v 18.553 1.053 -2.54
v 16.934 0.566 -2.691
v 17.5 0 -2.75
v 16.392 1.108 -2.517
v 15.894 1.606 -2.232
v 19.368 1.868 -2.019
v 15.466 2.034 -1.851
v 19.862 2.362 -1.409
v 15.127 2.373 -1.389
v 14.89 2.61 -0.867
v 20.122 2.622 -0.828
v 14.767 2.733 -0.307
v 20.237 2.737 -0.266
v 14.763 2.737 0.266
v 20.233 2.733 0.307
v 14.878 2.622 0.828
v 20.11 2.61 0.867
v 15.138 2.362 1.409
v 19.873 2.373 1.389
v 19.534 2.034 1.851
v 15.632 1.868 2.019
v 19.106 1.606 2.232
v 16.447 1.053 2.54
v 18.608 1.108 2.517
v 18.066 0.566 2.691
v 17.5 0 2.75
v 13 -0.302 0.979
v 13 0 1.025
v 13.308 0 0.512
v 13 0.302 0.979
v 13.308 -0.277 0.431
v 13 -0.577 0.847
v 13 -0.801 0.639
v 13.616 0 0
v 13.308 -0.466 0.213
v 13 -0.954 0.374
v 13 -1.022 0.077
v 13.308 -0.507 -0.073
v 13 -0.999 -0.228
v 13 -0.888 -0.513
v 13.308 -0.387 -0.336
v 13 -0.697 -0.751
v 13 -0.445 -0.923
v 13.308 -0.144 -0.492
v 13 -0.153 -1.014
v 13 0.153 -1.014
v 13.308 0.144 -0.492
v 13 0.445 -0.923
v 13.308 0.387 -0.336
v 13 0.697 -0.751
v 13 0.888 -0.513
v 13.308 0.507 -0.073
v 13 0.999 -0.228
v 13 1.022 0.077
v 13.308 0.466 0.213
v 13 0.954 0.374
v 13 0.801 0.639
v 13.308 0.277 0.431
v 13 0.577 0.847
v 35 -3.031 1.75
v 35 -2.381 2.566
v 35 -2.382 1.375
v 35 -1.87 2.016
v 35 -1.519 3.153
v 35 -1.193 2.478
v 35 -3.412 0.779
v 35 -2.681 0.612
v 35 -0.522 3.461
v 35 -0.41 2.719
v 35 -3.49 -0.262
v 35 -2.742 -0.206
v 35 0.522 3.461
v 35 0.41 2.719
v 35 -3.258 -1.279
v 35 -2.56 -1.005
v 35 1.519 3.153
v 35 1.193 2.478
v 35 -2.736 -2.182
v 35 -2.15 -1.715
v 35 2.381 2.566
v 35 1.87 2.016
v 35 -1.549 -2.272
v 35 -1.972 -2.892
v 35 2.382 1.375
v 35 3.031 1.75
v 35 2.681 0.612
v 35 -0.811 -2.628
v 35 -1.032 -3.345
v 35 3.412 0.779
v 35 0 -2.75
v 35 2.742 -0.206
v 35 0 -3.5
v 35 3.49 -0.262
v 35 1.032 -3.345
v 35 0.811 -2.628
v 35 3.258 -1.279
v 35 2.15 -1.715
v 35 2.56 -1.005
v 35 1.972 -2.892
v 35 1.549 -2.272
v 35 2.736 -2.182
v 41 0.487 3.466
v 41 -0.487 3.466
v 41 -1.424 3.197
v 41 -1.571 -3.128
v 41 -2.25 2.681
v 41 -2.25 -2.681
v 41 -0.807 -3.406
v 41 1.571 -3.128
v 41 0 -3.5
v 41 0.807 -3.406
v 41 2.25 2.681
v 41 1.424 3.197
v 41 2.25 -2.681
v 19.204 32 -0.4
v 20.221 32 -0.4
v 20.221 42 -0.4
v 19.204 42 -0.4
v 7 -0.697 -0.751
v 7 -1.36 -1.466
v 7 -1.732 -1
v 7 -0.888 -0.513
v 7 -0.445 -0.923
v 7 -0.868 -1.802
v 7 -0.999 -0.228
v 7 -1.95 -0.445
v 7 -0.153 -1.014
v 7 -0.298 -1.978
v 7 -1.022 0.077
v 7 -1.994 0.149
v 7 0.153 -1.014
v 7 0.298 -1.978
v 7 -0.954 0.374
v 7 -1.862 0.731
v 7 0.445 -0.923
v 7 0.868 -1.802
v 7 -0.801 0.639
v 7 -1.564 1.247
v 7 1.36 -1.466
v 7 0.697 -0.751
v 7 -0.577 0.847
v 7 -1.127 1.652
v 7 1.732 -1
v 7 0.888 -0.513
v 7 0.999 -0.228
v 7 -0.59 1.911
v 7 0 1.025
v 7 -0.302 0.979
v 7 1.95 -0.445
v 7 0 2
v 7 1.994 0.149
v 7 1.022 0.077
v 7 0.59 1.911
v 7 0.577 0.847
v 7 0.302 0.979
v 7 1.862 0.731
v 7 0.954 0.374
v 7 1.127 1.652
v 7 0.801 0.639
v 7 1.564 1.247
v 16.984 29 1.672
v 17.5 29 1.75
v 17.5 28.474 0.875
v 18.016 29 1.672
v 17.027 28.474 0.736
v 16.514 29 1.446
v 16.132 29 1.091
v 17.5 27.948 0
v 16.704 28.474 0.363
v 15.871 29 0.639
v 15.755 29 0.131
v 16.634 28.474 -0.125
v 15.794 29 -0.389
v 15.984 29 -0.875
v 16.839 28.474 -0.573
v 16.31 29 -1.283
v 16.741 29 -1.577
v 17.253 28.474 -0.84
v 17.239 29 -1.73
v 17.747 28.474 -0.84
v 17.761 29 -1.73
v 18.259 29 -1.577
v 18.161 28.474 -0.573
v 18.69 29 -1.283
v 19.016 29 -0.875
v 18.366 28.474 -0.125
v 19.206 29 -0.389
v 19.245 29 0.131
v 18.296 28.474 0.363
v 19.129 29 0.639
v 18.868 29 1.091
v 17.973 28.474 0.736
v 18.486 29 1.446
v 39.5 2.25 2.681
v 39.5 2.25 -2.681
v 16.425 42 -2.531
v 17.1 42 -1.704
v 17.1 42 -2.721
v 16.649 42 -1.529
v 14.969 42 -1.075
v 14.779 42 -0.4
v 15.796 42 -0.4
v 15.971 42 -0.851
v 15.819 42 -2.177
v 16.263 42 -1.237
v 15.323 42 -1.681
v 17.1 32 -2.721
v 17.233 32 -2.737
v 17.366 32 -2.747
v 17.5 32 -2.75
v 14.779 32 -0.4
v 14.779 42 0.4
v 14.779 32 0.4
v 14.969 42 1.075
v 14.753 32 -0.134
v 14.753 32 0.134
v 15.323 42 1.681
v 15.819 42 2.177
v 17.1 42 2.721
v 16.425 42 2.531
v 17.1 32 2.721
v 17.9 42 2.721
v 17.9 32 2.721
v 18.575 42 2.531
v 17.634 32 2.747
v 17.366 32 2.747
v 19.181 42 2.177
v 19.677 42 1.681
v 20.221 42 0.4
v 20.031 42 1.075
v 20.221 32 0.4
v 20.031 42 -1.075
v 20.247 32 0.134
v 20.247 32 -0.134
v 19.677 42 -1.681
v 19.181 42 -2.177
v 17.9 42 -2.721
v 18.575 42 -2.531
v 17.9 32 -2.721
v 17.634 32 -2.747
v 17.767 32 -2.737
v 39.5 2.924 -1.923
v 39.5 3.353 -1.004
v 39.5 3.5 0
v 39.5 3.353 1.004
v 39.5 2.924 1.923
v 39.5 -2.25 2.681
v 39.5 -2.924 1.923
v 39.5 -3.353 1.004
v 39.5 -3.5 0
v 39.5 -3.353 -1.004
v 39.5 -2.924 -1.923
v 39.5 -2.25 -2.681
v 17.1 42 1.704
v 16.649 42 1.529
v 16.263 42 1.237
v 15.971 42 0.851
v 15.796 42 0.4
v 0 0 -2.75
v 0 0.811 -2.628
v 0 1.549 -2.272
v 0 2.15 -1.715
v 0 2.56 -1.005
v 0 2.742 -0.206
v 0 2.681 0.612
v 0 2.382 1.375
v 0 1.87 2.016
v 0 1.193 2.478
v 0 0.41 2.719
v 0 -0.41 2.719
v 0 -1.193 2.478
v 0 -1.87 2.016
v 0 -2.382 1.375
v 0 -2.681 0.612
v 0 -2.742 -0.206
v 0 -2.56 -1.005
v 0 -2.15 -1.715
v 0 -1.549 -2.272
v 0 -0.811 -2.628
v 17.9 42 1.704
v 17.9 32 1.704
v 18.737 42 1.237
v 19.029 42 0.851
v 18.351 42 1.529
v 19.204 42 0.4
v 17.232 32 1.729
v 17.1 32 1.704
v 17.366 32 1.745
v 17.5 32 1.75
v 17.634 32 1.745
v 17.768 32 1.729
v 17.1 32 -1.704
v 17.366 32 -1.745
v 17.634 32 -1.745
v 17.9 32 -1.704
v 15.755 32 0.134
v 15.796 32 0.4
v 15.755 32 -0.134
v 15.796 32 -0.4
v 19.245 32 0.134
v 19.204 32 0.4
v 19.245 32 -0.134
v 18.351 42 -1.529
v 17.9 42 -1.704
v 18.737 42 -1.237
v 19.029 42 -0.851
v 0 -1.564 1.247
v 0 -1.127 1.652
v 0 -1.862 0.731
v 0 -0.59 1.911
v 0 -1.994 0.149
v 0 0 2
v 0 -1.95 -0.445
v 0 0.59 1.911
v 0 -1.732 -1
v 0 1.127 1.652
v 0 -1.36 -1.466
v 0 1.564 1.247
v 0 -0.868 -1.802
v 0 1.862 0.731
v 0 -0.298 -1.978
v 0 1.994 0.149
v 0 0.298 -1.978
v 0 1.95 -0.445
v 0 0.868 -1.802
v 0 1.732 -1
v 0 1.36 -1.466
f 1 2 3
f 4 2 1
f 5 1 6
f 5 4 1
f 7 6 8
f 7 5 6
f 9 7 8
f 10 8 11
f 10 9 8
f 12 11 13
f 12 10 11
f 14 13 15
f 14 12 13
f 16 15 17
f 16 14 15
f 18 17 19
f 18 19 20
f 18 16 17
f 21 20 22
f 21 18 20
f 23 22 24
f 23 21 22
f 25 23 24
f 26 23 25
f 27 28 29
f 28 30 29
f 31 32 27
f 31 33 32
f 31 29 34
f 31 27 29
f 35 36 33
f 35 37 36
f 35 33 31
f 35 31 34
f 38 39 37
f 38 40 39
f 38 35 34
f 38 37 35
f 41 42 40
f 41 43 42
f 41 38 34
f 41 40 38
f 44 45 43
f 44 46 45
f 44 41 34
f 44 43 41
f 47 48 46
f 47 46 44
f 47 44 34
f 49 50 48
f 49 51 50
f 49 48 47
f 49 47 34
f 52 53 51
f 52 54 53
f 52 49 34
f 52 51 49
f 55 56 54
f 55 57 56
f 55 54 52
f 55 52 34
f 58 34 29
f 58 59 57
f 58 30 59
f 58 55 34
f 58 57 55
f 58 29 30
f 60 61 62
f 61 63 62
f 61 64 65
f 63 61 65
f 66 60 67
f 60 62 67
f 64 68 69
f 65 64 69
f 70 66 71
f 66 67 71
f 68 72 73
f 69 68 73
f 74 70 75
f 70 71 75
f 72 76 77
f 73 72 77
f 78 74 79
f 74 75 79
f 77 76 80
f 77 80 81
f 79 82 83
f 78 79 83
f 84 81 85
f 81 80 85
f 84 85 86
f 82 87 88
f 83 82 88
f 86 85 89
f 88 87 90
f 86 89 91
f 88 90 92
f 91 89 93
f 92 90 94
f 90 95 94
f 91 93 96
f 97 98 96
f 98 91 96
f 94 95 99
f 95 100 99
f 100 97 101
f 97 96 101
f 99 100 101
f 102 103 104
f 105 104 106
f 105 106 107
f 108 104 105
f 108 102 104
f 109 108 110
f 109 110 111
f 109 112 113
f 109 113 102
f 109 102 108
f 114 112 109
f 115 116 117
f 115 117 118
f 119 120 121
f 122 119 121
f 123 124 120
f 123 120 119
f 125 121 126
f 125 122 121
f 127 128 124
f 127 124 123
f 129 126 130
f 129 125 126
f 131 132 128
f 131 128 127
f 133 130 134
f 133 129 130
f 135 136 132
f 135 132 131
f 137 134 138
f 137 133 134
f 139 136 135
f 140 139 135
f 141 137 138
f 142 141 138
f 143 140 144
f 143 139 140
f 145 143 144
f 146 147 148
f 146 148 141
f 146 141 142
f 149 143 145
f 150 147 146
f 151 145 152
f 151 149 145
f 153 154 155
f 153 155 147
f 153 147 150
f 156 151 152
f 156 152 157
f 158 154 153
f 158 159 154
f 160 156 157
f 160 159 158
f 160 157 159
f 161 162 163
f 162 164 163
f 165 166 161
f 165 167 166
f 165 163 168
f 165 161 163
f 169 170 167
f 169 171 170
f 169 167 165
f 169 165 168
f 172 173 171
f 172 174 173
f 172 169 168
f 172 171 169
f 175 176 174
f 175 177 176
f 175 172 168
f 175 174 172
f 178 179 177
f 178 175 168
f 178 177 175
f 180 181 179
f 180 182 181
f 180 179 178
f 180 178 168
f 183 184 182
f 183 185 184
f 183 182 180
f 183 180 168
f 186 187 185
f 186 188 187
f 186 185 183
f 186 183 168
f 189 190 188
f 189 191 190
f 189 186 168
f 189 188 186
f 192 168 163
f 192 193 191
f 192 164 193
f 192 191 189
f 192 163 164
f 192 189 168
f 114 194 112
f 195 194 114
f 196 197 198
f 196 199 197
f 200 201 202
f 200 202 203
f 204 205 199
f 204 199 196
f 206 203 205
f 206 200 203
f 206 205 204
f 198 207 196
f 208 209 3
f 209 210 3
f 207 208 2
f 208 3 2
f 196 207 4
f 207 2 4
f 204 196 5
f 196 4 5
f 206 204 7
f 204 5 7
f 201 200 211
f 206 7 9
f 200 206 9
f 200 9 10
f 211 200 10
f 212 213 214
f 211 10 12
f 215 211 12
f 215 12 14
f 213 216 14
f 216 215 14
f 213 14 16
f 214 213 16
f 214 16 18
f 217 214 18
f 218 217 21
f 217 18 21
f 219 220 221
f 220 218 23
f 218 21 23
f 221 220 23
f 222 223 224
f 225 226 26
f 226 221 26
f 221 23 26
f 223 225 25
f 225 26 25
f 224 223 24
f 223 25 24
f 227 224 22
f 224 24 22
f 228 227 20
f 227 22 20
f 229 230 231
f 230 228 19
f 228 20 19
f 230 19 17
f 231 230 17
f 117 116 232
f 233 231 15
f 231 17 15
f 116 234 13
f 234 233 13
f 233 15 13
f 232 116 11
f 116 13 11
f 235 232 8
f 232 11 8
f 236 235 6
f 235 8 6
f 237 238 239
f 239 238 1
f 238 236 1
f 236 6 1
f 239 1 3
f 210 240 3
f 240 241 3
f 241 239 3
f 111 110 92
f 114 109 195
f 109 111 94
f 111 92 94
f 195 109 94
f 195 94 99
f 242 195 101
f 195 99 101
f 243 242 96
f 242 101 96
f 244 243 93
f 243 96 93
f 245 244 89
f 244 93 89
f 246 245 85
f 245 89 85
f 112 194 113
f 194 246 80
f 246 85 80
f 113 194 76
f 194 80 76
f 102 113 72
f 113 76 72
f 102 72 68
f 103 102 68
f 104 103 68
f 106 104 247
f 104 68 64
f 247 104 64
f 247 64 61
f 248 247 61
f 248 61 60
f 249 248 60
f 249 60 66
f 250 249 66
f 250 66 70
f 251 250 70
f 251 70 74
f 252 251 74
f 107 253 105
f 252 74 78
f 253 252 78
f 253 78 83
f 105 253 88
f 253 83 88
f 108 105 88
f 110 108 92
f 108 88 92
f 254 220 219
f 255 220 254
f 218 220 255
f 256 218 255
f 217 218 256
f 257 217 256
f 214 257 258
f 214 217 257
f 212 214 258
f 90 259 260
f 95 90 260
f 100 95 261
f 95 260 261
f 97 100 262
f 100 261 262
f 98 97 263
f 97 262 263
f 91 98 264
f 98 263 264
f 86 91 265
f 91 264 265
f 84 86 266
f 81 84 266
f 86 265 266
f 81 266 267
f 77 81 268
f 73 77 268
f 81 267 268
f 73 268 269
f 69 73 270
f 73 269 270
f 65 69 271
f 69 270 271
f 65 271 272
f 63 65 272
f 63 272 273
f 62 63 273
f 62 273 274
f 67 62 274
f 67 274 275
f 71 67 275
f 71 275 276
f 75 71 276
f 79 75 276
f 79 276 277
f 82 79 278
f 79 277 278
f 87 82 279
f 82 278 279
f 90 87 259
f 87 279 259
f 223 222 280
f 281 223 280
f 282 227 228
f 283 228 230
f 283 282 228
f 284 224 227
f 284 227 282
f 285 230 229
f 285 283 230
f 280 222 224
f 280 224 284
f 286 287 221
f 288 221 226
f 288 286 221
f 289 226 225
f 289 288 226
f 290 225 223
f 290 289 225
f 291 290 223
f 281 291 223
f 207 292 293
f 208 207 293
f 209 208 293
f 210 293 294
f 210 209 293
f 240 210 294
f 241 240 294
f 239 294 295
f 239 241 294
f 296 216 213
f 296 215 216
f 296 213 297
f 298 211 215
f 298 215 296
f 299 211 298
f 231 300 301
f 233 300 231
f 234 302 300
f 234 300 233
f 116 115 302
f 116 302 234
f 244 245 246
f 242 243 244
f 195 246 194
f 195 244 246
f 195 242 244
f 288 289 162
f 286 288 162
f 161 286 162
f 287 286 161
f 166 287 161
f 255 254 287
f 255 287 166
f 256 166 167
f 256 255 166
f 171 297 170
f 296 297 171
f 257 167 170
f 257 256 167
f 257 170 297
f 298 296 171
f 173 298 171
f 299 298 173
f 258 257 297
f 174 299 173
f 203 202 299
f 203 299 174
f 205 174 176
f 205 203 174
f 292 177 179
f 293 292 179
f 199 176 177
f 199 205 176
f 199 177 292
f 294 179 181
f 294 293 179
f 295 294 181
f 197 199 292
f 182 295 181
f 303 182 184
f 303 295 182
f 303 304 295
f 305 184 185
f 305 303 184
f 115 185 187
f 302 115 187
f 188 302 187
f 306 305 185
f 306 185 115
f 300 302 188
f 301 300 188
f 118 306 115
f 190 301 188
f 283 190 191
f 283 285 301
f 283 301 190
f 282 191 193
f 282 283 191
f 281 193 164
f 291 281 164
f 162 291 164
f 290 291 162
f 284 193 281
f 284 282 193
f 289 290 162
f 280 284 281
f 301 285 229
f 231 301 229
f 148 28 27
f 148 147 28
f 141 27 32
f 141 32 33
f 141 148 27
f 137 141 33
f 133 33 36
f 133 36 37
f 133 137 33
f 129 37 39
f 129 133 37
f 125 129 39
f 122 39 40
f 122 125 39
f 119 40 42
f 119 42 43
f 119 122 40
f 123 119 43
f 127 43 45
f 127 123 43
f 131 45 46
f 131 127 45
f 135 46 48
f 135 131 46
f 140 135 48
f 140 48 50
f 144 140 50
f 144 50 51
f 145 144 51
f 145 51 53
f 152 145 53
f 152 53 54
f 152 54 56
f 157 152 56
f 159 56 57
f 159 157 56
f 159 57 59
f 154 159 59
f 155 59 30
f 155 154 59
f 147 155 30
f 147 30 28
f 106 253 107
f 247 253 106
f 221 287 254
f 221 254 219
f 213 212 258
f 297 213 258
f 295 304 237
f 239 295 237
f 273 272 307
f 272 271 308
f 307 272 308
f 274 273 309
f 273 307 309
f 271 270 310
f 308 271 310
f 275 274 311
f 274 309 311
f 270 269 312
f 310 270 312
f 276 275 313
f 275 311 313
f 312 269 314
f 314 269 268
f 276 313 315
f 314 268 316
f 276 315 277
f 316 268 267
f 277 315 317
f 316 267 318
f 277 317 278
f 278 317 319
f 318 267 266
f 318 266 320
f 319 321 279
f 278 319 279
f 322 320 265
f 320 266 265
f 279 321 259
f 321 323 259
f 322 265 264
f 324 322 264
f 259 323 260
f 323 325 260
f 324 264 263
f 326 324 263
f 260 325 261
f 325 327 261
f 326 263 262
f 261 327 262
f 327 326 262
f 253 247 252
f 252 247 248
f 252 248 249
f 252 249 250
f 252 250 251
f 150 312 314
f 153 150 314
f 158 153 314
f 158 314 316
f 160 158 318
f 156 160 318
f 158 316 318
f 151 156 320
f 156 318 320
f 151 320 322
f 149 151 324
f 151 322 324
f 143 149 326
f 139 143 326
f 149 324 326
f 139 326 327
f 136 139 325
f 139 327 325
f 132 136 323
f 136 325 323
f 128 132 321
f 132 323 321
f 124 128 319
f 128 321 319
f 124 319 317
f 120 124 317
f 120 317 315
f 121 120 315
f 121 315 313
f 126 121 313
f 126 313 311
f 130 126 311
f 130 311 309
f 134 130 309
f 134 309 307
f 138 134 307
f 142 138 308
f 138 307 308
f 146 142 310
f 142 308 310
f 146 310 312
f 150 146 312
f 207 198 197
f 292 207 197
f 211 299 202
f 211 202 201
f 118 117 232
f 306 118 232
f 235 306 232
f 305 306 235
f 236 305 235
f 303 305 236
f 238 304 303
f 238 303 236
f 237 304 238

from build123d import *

# Parameters (mm, degrees)
SKETCH_1_R                 = 2.75
EXTRUDE_1_DEPTH            = 35
SKETCH_2_R                 = 2.75
EXTRUDE_2_DEPTH            = 42
SKETCH_4_W                 = 0.8
SKETCH_4_H                 = 0.8
CUT_EXTRUDE_1_DEPTH        = 10
SKETCH_5_R                 = 3.5
EXTRUDE_3_DEPTH            = 6
CUT_EXTRUDE_START          = -1.5
CUT_EXTRUDE_2_DEPTH        = 1.5
SKETCH_7_R                 = 2
CUT_EXTRUDE_3_DEPTH        = 7
SPLIT_START                = 14
SPLIT_BODIES_1_DEPTH       = 7
SPLIT_BODIES_1_2_OUTLINE_R = 2.75
SPLIT_BODIES_1_2_DEPTH     = 2.75
SPLIT_BODIES_1_3_DEPTH     = 7


with BuildPart() as part:
    # Эскиз1 → Бобышка-Вытянуть1 (new body)
    with BuildSketch(Plane(origin=(0, 0, 0), x_dir=(0, 0, -1), z_dir=(1, 0, 0))):
        Circle(SKETCH_1_R)
    extrude(amount=EXTRUDE_1_DEPTH)

    # Эскиз5 → Бобышка-Вытянуть3 (add)
    with BuildSketch(Plane(origin=(35, 0, 0), x_dir=(0, 0, -1), z_dir=(1, 0, 0))):
        Circle(SKETCH_5_R)
    extrude(amount=EXTRUDE_3_DEPTH)

    # Эскиз6 → Вырез-Вытянуть2 (cut)
    with BuildSketch(Plane(origin=(41, 0, 0), x_dir=(0, 0, -1), z_dir=(1, 0, 0)).offset(CUT_EXTRUDE_START)):
        with BuildLine():
            ThreePointArc((2.680951324, 2.25), (0, 3.5), (-2.680951324, 2.25))
            Line((-2.680951324, 2.25), (2.680951324, 2.25))
        make_face()
        with BuildLine():
            Line((2.680951324, -2.25), (-2.680951324, -2.25))
            ThreePointArc((-2.680951324, -2.25), (0, -3.5), (2.680951324, -2.25))
        make_face()
    extrude(amount=CUT_EXTRUDE_2_DEPTH, mode=Mode.SUBTRACT)

    # Эскиз7 → Вырез-Вытянуть3 (cut)
    with BuildSketch(Plane.ZY):
        Circle(SKETCH_7_R)
    extrude(amount=-CUT_EXTRUDE_3_DEPTH, mode=Mode.SUBTRACT)

    # Эскиз8 → Отверстие обработанное метчиком M2.5x0.451 (revolve, cut)
    with BuildSketch(Plane(origin=(7, 0, 0), x_dir=(0, 0, 1), z_dir=(0, 1, 0))):
        Polygon((0, 0), (0, 6.615882135), (1.025, 6), (1.025, 0), align=None)
    revolve(axis=Axis((0.65, 0, 0), (1, 0, 0)), mode=Mode.SUBTRACT)


with BuildPart() as body_2:
    # Эскиз2 → Бобышка-Вытянуть2 (new body)
    with BuildSketch(Plane(origin=(0, 0, 0), x_dir=(1, 0, 0), z_dir=(0, 1, 0))):
        with Locations(Location((17.5, 0, 0), (0, 0, 90))):
            Circle(SKETCH_2_R)
    extrude(amount=EXTRUDE_2_DEPTH)

    # Эскиз3 → Диаметр отверстия Ø3.5 (3.5)1 (revolve, cut)
    with BuildSketch(Plane(origin=(17.5, 42, 0), x_dir=(0, 0, 1), z_dir=(1, 0, 0))):
        Polygon((0, 0), (0, 14.051506083), (1.75, 13), (1.75, 0), align=None)
    revolve(axis=Axis((17.5, 48.35, 0), (0, -1, 0)), mode=Mode.SUBTRACT)

    # Эскиз4 → Вырез-Вытянуть1 (cut)
    with BuildSketch(Plane(origin=(0, 42, 0), x_dir=(1, 0, 0), z_dir=(0, 1, 0))):
        with BuildLine():
            Line((17.1, 4), (17.1, 2.720753572))
            ThreePointArc((17.1, 2.720753572), (17.5, 2.75), (17.9, 2.720753572))
            Line((17.9, 2.720753572), (17.9, 4))
            Line((17.9, 4), (17.1, 4))
        make_face()
        with BuildLine():
            Line((17.1, -1.703672504), (17.1, -2.720753572))
            ThreePointArc((17.1, -2.720753572), (17.5, -2.75), (17.9, -2.720753572))
            Line((17.9, -2.720753572), (17.9, -1.703672504))
            ThreePointArc((17.9, -1.703672504), (17.5, -1.75), (17.1, -1.703672504))
        make_face()
        with BuildLine():
            ThreePointArc((17.9, 2.720753572), (17.5, 2.75), (17.1, 2.720753572))
            Line((17.1, 2.720753572), (17.1, 1.703672504))
            ThreePointArc((17.1, 1.703672504), (17.5, 1.75), (17.9, 1.703672504))
            Line((17.9, 1.703672504), (17.9, 2.720753572))
        make_face()
        with BuildLine():
            Line((17.1, 1.703672504), (17.1, 0.4))
            Line((17.1, 0.4), (17.9, 0.4))
            Line((17.9, 0.4), (17.9, 1.703672504))
            ThreePointArc((17.9, 1.703672504), (17.5, 1.75), (17.1, 1.703672504))
        make_face()
        with Locations((17.5, 0)):
            Rectangle(SKETCH_4_W, SKETCH_4_H)
        with BuildLine():
            Line((15.796327496, -0.4), (17.1, -0.4))
            Line((17.1, -0.4), (17.1, 0.4))
            Line((17.1, 0.4), (15.796327496, 0.4))
            ThreePointArc((15.796327496, 0.4), (15.75, 0), (15.796327496, -0.4))
        make_face()
        with BuildLine():
            ThreePointArc((14.779246428, 0.4), (14.75, 0), (14.779246428, -0.4))
            Line((14.779246428, -0.4), (15.796327496, -0.4))
            ThreePointArc((15.796327496, -0.4), (15.75, 0), (15.796327496, 0.4))
            Line((15.796327496, 0.4), (14.779246428, 0.4))
        make_face()
        with BuildLine():
            Line((19.203672504, -0.4), (20.220753572, -0.4))
            ThreePointArc((20.220753572, -0.4), (20.242678647, -0.200533883), (20.25, 0))
            ThreePointArc((20.25, 0), (20.242678647, 0.200533883), (20.220753572, 0.4))
            Line((20.220753572, 0.4), (19.203672504, 0.4))
            ThreePointArc((19.203672504, 0.4), (19.238379545, 0.20133693), (19.25, 0))
            ThreePointArc((19.25, 0), (19.238379545, -0.20133693), (19.203672504, -0.4))
        make_face()
        with BuildLine():
            Line((13.5, -0.4), (14.779246428, -0.4))
            ThreePointArc((14.779246428, -0.4), (14.75, 0), (14.779246428, 0.4))
            Line((14.779246428, 0.4), (13.5, 0.4))
            Line((13.5, 0.4), (13.5, -0.4))
        make_face()
        with BuildLine():
            Line((17.1, -0.4), (17.1, -1.703672504))
            ThreePointArc((17.1, -1.703672504), (17.5, -1.75), (17.9, -1.703672504))
            Line((17.9, -1.703672504), (17.9, -0.4))
            Line((17.9, -0.4), (17.1, -0.4))
        make_face()
        with BuildLine():
            Line((17.1, -2.720753572), (17.1, -4))
            Line((17.1, -4), (17.9, -4))
            Line((17.9, -4), (17.9, -2.720753572))
            ThreePointArc((17.9, -2.720753572), (17.5, -2.75), (17.1, -2.720753572))
        make_face()
        with BuildLine():
            Line((17.9, 0.4), (17.9, -0.4))
            Line((17.9, -0.4), (19.203672504, -0.4))
            ThreePointArc((19.203672504, -0.4), (19.238379545, -0.20133693), (19.25, 0))
            ThreePointArc((19.25, 0), (19.238379545, 0.20133693), (19.203672504, 0.4))
            Line((19.203672504, 0.4), (17.9, 0.4))
        make_face()
        with BuildLine():
            ThreePointArc((20.25, 0), (20.242678647, -0.200533883), (20.220753572, -0.4))
            Line((20.220753572, -0.4), (21.5, -0.4))
            Line((21.5, -0.4), (21.5, 0.4))
            Line((21.5, 0.4), (20.220753572, 0.4))
            ThreePointArc((20.220753572, 0.4), (20.242678647, 0.200533883), (20.25, 0))
        make_face()
    extrude(amount=-CUT_EXTRUDE_1_DEPTH, mode=Mode.SUBTRACT)

    # Split Bodies 1: read off the stored shape, not the designer's step
    # Split Bodies 1 outline → Split Bodies 1 (cut)
    with BuildSketch(Plane.YZ.offset(SPLIT_START)):
        with BuildLine():
            ThreePointArc((0, -2.75), (2.75, 0), (0, 2.75))
            Line((0, 2.75), (0, -2.75))
        make_face()
    extrude(amount=SPLIT_BODIES_1_DEPTH, mode=Mode.SUBTRACT)


with BuildPart() as body_3:
    # Split Bodies 1 2 outline → Split Bodies 1 2 (new body)
    with BuildSketch(Plane(origin=(0, 0, 0), x_dir=(1, 0, 0), z_dir=(0, 1, 0))):
        with Locations((17.5, 0)):
            Circle(SPLIT_BODIES_1_2_OUTLINE_R)
    extrude(amount=SPLIT_BODIES_1_2_DEPTH)

    # Split Bodies 1 3 outline → Split Bodies 1 3 (cut)
    with BuildSketch(Plane.YZ.offset(SPLIT_START)):
        with BuildLine():
            Line((-1, 2.75), (0, 2.75))
            ThreePointArc((0, 2.75), (1.944543648, 1.944543648), (2.75, 0))
            Line((2.75, 0), (2.75, 4))
            Line((2.75, 4), (-1, 4))
            Line((-1, 4), (-1, 2.75))
        make_face()
        with BuildLine():
            Line((2.75, -4), (2.75, 0))
            ThreePointArc((2.75, 0), (1.944543648, -1.944543648), (0, -2.75))
            Line((0, -2.75), (-1, -2.75))
            Line((-1, -2.75), (-1, -4))
            Line((-1, -4), (2.75, -4))
        make_face()
    extrude(amount=SPLIT_BODIES_1_3_DEPTH, mode=Mode.SUBTRACT)


solid = Compound([part.part, body_2.part])
